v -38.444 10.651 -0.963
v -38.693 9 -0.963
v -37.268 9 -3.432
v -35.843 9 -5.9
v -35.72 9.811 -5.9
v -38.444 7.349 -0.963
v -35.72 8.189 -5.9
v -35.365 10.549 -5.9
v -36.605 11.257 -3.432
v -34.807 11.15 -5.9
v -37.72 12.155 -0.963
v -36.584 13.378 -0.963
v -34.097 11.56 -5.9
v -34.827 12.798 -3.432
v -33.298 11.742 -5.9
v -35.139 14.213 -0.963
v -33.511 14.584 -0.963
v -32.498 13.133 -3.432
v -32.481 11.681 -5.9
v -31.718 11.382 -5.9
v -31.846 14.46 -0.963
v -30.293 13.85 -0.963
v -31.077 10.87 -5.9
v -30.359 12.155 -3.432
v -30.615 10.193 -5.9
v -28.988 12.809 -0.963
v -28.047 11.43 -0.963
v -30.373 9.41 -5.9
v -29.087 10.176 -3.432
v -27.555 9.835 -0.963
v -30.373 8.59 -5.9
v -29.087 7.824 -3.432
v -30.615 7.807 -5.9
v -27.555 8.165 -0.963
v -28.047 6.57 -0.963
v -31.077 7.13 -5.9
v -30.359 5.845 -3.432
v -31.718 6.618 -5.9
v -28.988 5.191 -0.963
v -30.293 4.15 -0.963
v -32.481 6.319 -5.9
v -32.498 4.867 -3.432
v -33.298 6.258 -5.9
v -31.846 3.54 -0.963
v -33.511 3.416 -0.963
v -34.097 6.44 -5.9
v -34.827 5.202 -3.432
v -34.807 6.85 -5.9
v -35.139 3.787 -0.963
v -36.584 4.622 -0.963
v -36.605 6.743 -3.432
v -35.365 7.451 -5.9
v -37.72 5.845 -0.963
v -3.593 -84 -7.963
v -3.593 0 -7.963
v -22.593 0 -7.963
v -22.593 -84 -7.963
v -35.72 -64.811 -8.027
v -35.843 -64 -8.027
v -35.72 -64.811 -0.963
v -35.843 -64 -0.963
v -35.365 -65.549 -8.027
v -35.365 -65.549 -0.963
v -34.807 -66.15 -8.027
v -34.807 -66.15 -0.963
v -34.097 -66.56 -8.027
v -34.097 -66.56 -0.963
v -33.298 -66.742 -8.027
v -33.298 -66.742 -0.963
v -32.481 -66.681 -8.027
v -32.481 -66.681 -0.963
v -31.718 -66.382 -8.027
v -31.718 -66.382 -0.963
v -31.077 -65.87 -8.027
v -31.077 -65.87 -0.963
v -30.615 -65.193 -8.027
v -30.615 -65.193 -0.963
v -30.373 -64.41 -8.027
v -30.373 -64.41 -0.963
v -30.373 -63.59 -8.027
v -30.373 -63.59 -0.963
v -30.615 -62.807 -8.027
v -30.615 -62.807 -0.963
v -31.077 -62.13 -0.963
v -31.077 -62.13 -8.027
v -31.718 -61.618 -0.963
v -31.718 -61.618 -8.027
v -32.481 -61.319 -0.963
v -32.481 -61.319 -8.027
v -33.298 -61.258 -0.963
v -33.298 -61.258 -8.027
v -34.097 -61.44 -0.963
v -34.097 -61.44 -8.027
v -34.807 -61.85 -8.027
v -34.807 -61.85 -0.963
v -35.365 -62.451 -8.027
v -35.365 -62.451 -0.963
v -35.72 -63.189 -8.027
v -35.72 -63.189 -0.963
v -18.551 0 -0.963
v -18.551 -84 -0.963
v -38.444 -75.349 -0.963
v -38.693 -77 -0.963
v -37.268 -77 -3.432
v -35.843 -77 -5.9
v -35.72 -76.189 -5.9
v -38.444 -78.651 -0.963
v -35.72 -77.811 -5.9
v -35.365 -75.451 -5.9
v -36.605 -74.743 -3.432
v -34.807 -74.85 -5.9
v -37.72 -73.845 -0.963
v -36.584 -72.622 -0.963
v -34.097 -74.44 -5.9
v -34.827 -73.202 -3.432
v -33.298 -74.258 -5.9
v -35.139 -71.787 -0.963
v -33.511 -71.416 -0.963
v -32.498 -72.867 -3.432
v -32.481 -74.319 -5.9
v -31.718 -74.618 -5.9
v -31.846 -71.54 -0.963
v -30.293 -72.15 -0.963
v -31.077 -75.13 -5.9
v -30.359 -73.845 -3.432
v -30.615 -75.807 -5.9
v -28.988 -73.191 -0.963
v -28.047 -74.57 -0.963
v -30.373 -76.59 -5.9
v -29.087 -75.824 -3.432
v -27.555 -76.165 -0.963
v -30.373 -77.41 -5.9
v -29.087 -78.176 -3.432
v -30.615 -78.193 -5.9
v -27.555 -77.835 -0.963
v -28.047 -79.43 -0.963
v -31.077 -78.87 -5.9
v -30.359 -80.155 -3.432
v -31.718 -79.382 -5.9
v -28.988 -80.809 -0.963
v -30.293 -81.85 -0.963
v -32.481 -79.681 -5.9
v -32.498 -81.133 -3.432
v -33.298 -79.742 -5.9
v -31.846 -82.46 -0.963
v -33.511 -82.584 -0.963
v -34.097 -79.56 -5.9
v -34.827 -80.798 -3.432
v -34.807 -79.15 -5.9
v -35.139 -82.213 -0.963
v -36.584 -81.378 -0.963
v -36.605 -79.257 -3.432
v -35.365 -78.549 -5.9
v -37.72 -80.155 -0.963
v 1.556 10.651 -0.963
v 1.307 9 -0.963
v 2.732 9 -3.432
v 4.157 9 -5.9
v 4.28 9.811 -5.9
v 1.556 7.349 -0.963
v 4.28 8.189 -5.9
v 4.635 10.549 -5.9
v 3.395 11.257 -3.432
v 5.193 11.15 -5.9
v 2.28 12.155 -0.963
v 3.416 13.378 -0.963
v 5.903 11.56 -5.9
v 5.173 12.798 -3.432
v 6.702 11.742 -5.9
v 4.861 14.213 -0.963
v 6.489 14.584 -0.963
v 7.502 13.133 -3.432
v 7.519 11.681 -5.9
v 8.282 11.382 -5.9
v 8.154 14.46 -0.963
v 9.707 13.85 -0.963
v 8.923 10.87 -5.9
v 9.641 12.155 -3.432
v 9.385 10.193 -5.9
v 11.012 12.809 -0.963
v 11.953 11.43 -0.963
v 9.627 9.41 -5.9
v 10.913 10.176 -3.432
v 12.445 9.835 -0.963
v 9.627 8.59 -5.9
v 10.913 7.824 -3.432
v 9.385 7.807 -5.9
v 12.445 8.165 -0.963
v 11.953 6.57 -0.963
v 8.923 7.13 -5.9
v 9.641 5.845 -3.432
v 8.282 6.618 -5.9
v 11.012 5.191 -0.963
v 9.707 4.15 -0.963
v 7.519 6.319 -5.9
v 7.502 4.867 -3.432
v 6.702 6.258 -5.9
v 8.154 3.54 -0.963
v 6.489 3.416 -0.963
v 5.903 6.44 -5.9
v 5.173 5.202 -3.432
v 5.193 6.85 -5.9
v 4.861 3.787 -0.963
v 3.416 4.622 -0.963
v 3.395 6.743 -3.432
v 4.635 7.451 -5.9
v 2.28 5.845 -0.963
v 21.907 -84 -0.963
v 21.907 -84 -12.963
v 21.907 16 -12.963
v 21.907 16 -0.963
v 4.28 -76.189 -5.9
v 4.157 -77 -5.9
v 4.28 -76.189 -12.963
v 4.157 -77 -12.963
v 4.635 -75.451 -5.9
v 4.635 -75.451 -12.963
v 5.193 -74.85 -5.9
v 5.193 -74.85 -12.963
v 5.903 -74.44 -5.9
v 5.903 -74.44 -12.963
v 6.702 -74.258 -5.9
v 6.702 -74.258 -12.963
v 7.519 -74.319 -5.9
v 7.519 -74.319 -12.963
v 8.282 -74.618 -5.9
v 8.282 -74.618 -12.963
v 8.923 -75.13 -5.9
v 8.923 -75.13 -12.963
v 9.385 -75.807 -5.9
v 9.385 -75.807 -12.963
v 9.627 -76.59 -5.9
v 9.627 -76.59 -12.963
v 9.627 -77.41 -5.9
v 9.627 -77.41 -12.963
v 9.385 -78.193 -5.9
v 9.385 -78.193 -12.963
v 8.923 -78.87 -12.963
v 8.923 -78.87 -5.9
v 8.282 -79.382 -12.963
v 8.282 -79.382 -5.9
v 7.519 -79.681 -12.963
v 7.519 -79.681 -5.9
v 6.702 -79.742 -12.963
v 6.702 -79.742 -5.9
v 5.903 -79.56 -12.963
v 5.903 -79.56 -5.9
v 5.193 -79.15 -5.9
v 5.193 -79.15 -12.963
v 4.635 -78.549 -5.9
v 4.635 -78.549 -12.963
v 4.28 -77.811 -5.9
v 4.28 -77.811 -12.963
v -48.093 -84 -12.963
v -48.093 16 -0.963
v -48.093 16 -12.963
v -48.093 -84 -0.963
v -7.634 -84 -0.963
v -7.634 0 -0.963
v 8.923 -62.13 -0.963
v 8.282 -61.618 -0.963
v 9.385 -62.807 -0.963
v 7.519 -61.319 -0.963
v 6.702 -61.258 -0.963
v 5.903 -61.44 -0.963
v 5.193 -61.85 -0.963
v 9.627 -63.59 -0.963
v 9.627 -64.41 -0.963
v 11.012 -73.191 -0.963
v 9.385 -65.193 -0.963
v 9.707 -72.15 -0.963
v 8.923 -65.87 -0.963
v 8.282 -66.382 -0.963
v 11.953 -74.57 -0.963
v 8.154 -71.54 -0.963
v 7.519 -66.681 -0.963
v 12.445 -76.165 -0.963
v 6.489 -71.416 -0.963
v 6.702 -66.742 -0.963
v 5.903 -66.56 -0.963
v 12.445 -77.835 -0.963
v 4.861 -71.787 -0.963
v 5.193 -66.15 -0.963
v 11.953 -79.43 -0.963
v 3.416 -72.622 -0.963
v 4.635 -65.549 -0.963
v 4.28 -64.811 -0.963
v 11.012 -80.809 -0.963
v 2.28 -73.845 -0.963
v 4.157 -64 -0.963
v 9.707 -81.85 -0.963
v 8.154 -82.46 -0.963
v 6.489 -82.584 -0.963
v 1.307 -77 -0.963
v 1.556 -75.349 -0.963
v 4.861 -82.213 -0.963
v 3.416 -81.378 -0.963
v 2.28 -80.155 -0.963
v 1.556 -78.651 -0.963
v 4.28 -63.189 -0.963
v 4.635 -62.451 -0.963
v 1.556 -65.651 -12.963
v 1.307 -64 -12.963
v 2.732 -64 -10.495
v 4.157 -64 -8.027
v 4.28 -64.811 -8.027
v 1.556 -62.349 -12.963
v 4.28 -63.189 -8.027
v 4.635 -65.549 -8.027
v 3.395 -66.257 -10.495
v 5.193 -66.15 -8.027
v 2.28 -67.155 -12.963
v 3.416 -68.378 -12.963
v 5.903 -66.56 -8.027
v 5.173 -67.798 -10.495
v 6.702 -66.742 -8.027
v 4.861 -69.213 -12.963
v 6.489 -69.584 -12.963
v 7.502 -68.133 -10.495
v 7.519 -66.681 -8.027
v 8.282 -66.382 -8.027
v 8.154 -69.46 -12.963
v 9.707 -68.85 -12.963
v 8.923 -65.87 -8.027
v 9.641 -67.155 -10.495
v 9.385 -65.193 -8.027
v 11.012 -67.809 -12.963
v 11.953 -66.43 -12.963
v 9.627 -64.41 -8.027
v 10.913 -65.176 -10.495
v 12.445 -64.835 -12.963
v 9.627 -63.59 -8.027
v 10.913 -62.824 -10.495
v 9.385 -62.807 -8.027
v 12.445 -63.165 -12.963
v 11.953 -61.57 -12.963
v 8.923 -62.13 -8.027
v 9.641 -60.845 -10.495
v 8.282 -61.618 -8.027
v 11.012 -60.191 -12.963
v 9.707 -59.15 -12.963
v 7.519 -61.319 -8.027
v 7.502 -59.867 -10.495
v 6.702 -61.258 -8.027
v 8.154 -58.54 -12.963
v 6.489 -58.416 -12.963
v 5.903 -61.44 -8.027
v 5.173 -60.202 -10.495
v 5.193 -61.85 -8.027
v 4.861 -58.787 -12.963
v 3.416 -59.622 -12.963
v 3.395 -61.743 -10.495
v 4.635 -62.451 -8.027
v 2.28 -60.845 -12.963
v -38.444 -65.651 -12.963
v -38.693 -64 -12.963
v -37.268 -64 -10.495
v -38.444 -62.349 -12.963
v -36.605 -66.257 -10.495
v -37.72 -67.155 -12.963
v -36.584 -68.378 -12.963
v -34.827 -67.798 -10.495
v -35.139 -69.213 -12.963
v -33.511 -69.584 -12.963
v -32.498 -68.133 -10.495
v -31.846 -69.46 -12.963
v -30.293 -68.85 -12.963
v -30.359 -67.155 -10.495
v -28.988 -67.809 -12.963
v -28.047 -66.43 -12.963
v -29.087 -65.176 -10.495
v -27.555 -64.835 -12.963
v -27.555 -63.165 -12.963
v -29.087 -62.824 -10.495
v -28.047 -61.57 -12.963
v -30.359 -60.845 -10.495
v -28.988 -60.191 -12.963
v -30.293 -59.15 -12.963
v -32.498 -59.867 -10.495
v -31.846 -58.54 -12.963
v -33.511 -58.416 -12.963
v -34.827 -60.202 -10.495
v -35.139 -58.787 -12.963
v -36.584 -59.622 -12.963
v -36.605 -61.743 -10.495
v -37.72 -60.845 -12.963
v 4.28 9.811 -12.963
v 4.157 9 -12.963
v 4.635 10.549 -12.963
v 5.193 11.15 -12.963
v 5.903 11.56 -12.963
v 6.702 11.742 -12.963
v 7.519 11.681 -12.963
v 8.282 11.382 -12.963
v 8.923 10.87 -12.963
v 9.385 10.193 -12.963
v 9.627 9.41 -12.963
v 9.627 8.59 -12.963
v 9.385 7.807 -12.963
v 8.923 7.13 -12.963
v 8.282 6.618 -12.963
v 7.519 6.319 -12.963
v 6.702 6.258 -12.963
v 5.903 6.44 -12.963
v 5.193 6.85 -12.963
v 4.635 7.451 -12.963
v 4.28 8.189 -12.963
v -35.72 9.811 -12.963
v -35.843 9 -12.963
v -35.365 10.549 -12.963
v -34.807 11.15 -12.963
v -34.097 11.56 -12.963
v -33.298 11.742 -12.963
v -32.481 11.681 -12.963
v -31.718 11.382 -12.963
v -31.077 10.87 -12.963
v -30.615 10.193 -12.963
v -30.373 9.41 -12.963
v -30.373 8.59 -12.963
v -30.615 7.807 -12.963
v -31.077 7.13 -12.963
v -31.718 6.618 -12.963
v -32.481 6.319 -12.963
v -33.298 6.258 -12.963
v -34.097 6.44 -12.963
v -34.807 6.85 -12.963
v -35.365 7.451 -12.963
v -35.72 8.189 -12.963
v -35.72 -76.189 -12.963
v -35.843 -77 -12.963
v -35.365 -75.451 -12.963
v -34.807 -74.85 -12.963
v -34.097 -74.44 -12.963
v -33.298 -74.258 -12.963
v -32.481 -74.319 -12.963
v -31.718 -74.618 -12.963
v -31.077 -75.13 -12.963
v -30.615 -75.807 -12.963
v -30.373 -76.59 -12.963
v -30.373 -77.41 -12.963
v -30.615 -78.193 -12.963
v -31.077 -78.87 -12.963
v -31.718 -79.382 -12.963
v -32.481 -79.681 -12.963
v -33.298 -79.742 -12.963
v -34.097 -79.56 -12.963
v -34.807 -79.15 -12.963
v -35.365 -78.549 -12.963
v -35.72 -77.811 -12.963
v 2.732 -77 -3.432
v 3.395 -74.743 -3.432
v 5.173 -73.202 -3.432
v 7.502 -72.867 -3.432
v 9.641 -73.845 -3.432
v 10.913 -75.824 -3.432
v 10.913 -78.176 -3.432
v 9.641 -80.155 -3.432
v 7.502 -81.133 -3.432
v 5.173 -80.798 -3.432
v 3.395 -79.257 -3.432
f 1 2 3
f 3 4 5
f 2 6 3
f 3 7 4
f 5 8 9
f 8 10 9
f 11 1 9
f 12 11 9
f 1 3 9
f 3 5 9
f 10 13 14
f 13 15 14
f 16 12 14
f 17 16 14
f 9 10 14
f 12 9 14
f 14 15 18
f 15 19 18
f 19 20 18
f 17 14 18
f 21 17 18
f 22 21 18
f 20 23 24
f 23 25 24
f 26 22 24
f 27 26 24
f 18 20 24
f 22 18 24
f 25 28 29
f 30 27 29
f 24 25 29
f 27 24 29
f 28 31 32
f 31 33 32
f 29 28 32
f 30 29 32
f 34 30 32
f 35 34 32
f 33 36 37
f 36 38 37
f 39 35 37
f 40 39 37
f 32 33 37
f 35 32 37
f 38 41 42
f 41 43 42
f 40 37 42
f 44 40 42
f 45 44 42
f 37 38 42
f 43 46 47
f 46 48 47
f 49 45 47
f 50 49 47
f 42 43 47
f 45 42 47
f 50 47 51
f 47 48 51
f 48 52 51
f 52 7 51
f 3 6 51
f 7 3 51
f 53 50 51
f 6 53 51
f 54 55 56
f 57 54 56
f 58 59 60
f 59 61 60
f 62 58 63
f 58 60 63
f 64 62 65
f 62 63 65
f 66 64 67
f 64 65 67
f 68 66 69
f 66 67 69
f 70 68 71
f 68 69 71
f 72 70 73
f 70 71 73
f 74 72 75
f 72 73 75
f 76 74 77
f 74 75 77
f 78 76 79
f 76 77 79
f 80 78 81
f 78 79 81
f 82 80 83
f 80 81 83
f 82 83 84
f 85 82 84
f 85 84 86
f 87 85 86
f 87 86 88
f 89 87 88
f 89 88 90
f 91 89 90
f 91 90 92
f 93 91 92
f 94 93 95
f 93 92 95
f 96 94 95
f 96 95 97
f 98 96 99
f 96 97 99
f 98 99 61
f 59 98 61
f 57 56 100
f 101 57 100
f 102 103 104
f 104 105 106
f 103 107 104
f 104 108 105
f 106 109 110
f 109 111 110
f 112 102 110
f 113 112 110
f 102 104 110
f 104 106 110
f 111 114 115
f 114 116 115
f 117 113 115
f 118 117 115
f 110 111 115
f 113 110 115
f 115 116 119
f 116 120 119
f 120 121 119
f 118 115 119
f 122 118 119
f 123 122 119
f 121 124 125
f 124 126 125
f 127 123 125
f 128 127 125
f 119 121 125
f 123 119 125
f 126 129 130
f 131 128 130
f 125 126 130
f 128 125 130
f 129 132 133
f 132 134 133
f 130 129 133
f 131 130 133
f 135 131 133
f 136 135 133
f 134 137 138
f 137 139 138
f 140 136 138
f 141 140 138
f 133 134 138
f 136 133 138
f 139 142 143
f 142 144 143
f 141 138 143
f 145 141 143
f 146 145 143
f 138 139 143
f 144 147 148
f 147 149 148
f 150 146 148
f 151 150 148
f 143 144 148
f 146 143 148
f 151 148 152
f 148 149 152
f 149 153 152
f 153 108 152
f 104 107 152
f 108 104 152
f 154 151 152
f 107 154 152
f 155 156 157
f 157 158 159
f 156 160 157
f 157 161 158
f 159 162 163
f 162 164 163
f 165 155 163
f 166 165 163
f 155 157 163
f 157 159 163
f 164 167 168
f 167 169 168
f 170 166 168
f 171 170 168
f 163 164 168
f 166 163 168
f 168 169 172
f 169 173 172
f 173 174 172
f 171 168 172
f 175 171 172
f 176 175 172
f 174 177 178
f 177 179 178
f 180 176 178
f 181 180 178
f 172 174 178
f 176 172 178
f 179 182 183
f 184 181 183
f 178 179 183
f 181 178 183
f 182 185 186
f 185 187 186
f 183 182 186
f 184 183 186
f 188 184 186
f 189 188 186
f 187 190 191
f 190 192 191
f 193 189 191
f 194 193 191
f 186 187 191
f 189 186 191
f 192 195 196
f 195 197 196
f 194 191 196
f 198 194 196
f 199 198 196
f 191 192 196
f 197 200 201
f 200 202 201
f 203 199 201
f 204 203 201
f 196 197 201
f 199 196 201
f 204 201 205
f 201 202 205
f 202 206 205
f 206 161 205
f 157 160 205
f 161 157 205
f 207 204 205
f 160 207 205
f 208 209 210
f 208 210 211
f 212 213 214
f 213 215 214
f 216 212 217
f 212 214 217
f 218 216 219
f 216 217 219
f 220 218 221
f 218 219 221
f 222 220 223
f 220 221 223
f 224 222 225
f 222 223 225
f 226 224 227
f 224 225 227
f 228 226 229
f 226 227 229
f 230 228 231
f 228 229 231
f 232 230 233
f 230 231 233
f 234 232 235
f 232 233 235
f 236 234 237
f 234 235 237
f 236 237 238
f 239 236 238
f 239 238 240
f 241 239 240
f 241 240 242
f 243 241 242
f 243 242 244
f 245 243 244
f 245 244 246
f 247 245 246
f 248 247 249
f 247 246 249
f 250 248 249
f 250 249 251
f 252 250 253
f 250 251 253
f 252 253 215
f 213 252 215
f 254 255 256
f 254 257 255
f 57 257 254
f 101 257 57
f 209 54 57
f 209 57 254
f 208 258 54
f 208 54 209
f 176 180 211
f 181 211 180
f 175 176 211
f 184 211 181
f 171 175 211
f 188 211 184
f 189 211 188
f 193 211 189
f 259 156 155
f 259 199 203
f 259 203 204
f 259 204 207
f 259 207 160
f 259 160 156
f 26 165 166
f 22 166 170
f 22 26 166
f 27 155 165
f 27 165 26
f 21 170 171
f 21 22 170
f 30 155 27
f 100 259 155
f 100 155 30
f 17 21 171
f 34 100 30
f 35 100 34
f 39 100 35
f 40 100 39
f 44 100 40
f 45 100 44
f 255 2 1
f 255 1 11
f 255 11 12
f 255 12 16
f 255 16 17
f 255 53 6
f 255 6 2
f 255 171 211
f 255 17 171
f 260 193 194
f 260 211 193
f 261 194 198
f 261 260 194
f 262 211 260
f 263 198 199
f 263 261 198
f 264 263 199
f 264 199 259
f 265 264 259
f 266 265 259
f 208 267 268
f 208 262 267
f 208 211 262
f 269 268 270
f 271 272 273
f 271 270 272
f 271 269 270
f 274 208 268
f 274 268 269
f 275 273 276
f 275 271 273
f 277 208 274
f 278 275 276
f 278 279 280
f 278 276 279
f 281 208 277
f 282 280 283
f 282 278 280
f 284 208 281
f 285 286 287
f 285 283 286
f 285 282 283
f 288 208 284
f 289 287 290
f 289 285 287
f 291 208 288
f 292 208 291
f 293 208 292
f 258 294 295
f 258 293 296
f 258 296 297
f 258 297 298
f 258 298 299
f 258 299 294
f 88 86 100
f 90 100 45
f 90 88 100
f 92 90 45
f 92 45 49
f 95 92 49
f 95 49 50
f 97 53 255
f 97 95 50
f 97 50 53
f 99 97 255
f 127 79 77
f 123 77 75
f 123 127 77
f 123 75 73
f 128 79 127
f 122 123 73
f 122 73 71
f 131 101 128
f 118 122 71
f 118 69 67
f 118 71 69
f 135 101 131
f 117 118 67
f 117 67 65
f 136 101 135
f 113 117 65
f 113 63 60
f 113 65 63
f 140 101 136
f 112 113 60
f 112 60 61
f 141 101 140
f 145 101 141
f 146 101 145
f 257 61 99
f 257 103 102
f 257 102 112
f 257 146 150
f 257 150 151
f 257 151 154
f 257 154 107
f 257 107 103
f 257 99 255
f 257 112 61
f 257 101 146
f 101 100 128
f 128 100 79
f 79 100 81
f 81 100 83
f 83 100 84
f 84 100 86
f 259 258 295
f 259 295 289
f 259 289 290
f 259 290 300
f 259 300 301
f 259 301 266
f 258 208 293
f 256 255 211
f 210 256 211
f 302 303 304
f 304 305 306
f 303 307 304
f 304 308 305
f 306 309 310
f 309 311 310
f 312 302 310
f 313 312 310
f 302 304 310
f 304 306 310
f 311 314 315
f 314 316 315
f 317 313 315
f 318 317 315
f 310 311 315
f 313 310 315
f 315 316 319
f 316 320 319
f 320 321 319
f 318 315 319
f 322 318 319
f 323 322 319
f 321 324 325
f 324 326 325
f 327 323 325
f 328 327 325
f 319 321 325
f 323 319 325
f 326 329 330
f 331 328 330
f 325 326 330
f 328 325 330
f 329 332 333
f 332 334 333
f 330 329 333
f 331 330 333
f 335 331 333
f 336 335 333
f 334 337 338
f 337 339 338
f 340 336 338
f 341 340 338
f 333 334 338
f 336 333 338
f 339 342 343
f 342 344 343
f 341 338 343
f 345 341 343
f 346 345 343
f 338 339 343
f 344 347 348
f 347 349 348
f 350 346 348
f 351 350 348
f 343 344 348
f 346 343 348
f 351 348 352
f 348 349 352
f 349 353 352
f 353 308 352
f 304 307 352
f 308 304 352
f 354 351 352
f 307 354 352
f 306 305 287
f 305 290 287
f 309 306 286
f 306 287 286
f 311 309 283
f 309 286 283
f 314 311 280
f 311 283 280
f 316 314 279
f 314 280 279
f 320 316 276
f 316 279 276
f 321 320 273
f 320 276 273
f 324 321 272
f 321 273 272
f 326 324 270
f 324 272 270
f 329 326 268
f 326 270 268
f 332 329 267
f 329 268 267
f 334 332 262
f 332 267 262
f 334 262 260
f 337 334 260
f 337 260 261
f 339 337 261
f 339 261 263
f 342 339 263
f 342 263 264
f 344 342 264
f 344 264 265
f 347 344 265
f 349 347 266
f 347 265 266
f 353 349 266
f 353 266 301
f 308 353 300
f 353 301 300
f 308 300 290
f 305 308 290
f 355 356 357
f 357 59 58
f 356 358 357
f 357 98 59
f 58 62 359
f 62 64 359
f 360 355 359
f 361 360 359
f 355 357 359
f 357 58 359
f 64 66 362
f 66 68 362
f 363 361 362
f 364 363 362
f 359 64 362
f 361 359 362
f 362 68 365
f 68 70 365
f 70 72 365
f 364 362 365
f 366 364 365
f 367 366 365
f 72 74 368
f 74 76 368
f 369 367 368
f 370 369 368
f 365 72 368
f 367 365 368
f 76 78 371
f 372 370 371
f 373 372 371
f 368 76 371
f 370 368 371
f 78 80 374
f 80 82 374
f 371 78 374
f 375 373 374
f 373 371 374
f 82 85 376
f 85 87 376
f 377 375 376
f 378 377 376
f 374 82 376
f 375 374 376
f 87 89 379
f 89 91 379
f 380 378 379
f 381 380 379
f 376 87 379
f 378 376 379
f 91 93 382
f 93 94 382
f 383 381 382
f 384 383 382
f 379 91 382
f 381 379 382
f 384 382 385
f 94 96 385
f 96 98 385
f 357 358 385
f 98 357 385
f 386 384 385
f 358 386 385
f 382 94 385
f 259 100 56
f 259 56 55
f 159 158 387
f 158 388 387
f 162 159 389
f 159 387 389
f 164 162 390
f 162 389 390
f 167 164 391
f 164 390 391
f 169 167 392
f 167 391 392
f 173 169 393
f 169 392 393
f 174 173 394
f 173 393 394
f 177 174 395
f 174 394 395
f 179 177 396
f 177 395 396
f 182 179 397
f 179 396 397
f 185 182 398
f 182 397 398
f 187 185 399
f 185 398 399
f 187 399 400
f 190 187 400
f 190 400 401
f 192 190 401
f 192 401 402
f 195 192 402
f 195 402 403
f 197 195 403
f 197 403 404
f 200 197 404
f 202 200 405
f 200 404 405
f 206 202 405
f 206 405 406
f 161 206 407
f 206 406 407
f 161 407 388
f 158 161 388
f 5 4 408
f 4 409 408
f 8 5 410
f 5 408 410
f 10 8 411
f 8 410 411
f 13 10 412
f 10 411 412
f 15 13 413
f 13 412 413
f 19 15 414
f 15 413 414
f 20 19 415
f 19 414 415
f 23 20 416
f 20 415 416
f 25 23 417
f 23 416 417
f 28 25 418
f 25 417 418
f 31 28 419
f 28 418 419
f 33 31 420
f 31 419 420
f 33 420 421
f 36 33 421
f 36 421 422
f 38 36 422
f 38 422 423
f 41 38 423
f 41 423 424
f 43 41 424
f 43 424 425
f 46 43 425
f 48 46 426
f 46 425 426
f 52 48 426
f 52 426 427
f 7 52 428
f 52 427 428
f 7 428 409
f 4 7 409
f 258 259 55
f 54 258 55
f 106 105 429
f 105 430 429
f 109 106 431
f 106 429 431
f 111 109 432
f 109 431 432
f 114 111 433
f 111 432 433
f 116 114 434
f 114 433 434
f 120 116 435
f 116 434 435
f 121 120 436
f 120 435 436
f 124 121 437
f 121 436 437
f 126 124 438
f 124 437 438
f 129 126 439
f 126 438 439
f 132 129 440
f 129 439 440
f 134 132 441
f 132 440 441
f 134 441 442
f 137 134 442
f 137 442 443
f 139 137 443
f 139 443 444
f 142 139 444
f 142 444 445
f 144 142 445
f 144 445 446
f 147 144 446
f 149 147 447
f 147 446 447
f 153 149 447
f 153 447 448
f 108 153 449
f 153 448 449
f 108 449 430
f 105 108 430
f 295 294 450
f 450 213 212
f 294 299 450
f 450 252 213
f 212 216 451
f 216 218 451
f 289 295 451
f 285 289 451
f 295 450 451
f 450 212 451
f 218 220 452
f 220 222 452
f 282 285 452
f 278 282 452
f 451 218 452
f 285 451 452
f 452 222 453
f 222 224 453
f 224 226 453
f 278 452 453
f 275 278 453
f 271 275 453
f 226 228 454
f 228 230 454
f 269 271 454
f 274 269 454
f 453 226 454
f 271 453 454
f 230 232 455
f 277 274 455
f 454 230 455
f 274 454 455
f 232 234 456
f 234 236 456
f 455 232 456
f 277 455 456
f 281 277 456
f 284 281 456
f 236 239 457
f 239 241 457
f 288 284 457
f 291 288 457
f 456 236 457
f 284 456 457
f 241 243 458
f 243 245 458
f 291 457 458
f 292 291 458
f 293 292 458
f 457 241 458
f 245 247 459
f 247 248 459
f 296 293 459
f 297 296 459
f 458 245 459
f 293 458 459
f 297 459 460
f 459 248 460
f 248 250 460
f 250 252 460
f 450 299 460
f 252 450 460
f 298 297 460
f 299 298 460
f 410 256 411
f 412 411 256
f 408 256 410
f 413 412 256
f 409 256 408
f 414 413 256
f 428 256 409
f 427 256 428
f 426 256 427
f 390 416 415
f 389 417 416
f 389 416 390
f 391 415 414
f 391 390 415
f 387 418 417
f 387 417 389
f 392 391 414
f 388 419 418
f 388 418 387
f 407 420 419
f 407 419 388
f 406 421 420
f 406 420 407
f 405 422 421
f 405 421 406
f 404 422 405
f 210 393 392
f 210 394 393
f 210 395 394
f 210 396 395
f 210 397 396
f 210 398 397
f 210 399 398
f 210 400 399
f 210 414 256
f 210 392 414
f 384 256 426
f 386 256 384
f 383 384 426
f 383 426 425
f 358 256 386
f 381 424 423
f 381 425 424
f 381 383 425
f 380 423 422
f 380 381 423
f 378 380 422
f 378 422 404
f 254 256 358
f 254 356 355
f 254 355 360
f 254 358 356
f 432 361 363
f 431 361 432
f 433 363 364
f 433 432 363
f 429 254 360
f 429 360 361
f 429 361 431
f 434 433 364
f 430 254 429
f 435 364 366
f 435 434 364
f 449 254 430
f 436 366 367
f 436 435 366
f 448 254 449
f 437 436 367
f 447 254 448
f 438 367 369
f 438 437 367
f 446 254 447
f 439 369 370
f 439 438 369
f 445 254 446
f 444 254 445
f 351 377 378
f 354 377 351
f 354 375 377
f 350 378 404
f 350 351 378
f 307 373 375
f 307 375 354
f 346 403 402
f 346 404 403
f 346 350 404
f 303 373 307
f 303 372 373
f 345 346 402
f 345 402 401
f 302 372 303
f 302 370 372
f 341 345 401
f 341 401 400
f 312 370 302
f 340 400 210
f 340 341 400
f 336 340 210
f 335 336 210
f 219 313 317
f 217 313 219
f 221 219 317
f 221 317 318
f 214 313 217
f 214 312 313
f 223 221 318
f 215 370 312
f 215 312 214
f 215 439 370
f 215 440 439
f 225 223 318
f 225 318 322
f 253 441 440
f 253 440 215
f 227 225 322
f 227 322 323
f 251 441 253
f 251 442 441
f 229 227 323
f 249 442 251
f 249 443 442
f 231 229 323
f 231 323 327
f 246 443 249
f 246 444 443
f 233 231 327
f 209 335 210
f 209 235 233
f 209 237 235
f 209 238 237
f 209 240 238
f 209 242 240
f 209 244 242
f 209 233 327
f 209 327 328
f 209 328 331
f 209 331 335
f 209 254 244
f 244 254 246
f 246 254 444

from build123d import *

# Parameters (mm, degrees)
F1_DEPTH       = 84
F2_DEPTH       = 16
F4_D           = 5.5
F4_CSINK_D     = 11.2
F4_CSINK_ANGLE = 60
F6_D           = 5.5
F6_CSINK_D     = 11.2
F6_CSINK_ANGLE = 60


with BuildPart() as f1:
    # F0 (on Front) → F1 (new body)
    with BuildSketch(Plane.XZ):
        Polygon((-48.092596, -0.963417), (-48.092596, -12.963417), (21.907404, -12.963417), (21.907404, -0.963417), (-7.634048, -0.963417), (-3.592596, -7.963417), (-13.092596, -7.963417), (-22.592596, -7.963417), (-18.551144, -0.963417), align=None)
    extrude(amount=F1_DEPTH)

    # F0 (on Front) → F2 (join)
    with BuildSketch(Plane.XZ):
        Polygon((-48.092596, -0.963417), (-48.092596, -12.963417), (21.907404, -12.963417), (21.907404, -0.963417), (-7.634048, -0.963417), (-3.592596, -7.963417), (-13.092596, -7.963417), (-22.592596, -7.963417), (-18.551144, -0.963417), align=None)
        Polygon((-7.634048, -0.963417), (-18.551144, -0.963417), (-22.592596, -7.963417), (-13.092596, -7.963417), (-3.592596, -7.963417), align=None)
    extrude(amount=-F2_DEPTH)

    # F4 (through all)
    with Locations(Plane.XY.offset(-0.963417)):
        with Locations((-33.092596, 9), (6.907404, 9), (6.907404, -77), (-33.092596, -77)):
            CounterSinkHole(F4_D / 2, F4_CSINK_D / 2, counter_sink_angle=F4_CSINK_ANGLE)

    # F6 (through all)
    with Locations(Plane(origin=(0, 0, -12.963417), x_dir=(1, 0, 0), z_dir=(0, 0, -1))):
        with Locations((-33.092596, 64), (6.907404, 64)):
            CounterSinkHole(F6_D / 2, F6_CSINK_D / 2, counter_sink_angle=F6_CSINK_ANGLE)


solid = f1.part
